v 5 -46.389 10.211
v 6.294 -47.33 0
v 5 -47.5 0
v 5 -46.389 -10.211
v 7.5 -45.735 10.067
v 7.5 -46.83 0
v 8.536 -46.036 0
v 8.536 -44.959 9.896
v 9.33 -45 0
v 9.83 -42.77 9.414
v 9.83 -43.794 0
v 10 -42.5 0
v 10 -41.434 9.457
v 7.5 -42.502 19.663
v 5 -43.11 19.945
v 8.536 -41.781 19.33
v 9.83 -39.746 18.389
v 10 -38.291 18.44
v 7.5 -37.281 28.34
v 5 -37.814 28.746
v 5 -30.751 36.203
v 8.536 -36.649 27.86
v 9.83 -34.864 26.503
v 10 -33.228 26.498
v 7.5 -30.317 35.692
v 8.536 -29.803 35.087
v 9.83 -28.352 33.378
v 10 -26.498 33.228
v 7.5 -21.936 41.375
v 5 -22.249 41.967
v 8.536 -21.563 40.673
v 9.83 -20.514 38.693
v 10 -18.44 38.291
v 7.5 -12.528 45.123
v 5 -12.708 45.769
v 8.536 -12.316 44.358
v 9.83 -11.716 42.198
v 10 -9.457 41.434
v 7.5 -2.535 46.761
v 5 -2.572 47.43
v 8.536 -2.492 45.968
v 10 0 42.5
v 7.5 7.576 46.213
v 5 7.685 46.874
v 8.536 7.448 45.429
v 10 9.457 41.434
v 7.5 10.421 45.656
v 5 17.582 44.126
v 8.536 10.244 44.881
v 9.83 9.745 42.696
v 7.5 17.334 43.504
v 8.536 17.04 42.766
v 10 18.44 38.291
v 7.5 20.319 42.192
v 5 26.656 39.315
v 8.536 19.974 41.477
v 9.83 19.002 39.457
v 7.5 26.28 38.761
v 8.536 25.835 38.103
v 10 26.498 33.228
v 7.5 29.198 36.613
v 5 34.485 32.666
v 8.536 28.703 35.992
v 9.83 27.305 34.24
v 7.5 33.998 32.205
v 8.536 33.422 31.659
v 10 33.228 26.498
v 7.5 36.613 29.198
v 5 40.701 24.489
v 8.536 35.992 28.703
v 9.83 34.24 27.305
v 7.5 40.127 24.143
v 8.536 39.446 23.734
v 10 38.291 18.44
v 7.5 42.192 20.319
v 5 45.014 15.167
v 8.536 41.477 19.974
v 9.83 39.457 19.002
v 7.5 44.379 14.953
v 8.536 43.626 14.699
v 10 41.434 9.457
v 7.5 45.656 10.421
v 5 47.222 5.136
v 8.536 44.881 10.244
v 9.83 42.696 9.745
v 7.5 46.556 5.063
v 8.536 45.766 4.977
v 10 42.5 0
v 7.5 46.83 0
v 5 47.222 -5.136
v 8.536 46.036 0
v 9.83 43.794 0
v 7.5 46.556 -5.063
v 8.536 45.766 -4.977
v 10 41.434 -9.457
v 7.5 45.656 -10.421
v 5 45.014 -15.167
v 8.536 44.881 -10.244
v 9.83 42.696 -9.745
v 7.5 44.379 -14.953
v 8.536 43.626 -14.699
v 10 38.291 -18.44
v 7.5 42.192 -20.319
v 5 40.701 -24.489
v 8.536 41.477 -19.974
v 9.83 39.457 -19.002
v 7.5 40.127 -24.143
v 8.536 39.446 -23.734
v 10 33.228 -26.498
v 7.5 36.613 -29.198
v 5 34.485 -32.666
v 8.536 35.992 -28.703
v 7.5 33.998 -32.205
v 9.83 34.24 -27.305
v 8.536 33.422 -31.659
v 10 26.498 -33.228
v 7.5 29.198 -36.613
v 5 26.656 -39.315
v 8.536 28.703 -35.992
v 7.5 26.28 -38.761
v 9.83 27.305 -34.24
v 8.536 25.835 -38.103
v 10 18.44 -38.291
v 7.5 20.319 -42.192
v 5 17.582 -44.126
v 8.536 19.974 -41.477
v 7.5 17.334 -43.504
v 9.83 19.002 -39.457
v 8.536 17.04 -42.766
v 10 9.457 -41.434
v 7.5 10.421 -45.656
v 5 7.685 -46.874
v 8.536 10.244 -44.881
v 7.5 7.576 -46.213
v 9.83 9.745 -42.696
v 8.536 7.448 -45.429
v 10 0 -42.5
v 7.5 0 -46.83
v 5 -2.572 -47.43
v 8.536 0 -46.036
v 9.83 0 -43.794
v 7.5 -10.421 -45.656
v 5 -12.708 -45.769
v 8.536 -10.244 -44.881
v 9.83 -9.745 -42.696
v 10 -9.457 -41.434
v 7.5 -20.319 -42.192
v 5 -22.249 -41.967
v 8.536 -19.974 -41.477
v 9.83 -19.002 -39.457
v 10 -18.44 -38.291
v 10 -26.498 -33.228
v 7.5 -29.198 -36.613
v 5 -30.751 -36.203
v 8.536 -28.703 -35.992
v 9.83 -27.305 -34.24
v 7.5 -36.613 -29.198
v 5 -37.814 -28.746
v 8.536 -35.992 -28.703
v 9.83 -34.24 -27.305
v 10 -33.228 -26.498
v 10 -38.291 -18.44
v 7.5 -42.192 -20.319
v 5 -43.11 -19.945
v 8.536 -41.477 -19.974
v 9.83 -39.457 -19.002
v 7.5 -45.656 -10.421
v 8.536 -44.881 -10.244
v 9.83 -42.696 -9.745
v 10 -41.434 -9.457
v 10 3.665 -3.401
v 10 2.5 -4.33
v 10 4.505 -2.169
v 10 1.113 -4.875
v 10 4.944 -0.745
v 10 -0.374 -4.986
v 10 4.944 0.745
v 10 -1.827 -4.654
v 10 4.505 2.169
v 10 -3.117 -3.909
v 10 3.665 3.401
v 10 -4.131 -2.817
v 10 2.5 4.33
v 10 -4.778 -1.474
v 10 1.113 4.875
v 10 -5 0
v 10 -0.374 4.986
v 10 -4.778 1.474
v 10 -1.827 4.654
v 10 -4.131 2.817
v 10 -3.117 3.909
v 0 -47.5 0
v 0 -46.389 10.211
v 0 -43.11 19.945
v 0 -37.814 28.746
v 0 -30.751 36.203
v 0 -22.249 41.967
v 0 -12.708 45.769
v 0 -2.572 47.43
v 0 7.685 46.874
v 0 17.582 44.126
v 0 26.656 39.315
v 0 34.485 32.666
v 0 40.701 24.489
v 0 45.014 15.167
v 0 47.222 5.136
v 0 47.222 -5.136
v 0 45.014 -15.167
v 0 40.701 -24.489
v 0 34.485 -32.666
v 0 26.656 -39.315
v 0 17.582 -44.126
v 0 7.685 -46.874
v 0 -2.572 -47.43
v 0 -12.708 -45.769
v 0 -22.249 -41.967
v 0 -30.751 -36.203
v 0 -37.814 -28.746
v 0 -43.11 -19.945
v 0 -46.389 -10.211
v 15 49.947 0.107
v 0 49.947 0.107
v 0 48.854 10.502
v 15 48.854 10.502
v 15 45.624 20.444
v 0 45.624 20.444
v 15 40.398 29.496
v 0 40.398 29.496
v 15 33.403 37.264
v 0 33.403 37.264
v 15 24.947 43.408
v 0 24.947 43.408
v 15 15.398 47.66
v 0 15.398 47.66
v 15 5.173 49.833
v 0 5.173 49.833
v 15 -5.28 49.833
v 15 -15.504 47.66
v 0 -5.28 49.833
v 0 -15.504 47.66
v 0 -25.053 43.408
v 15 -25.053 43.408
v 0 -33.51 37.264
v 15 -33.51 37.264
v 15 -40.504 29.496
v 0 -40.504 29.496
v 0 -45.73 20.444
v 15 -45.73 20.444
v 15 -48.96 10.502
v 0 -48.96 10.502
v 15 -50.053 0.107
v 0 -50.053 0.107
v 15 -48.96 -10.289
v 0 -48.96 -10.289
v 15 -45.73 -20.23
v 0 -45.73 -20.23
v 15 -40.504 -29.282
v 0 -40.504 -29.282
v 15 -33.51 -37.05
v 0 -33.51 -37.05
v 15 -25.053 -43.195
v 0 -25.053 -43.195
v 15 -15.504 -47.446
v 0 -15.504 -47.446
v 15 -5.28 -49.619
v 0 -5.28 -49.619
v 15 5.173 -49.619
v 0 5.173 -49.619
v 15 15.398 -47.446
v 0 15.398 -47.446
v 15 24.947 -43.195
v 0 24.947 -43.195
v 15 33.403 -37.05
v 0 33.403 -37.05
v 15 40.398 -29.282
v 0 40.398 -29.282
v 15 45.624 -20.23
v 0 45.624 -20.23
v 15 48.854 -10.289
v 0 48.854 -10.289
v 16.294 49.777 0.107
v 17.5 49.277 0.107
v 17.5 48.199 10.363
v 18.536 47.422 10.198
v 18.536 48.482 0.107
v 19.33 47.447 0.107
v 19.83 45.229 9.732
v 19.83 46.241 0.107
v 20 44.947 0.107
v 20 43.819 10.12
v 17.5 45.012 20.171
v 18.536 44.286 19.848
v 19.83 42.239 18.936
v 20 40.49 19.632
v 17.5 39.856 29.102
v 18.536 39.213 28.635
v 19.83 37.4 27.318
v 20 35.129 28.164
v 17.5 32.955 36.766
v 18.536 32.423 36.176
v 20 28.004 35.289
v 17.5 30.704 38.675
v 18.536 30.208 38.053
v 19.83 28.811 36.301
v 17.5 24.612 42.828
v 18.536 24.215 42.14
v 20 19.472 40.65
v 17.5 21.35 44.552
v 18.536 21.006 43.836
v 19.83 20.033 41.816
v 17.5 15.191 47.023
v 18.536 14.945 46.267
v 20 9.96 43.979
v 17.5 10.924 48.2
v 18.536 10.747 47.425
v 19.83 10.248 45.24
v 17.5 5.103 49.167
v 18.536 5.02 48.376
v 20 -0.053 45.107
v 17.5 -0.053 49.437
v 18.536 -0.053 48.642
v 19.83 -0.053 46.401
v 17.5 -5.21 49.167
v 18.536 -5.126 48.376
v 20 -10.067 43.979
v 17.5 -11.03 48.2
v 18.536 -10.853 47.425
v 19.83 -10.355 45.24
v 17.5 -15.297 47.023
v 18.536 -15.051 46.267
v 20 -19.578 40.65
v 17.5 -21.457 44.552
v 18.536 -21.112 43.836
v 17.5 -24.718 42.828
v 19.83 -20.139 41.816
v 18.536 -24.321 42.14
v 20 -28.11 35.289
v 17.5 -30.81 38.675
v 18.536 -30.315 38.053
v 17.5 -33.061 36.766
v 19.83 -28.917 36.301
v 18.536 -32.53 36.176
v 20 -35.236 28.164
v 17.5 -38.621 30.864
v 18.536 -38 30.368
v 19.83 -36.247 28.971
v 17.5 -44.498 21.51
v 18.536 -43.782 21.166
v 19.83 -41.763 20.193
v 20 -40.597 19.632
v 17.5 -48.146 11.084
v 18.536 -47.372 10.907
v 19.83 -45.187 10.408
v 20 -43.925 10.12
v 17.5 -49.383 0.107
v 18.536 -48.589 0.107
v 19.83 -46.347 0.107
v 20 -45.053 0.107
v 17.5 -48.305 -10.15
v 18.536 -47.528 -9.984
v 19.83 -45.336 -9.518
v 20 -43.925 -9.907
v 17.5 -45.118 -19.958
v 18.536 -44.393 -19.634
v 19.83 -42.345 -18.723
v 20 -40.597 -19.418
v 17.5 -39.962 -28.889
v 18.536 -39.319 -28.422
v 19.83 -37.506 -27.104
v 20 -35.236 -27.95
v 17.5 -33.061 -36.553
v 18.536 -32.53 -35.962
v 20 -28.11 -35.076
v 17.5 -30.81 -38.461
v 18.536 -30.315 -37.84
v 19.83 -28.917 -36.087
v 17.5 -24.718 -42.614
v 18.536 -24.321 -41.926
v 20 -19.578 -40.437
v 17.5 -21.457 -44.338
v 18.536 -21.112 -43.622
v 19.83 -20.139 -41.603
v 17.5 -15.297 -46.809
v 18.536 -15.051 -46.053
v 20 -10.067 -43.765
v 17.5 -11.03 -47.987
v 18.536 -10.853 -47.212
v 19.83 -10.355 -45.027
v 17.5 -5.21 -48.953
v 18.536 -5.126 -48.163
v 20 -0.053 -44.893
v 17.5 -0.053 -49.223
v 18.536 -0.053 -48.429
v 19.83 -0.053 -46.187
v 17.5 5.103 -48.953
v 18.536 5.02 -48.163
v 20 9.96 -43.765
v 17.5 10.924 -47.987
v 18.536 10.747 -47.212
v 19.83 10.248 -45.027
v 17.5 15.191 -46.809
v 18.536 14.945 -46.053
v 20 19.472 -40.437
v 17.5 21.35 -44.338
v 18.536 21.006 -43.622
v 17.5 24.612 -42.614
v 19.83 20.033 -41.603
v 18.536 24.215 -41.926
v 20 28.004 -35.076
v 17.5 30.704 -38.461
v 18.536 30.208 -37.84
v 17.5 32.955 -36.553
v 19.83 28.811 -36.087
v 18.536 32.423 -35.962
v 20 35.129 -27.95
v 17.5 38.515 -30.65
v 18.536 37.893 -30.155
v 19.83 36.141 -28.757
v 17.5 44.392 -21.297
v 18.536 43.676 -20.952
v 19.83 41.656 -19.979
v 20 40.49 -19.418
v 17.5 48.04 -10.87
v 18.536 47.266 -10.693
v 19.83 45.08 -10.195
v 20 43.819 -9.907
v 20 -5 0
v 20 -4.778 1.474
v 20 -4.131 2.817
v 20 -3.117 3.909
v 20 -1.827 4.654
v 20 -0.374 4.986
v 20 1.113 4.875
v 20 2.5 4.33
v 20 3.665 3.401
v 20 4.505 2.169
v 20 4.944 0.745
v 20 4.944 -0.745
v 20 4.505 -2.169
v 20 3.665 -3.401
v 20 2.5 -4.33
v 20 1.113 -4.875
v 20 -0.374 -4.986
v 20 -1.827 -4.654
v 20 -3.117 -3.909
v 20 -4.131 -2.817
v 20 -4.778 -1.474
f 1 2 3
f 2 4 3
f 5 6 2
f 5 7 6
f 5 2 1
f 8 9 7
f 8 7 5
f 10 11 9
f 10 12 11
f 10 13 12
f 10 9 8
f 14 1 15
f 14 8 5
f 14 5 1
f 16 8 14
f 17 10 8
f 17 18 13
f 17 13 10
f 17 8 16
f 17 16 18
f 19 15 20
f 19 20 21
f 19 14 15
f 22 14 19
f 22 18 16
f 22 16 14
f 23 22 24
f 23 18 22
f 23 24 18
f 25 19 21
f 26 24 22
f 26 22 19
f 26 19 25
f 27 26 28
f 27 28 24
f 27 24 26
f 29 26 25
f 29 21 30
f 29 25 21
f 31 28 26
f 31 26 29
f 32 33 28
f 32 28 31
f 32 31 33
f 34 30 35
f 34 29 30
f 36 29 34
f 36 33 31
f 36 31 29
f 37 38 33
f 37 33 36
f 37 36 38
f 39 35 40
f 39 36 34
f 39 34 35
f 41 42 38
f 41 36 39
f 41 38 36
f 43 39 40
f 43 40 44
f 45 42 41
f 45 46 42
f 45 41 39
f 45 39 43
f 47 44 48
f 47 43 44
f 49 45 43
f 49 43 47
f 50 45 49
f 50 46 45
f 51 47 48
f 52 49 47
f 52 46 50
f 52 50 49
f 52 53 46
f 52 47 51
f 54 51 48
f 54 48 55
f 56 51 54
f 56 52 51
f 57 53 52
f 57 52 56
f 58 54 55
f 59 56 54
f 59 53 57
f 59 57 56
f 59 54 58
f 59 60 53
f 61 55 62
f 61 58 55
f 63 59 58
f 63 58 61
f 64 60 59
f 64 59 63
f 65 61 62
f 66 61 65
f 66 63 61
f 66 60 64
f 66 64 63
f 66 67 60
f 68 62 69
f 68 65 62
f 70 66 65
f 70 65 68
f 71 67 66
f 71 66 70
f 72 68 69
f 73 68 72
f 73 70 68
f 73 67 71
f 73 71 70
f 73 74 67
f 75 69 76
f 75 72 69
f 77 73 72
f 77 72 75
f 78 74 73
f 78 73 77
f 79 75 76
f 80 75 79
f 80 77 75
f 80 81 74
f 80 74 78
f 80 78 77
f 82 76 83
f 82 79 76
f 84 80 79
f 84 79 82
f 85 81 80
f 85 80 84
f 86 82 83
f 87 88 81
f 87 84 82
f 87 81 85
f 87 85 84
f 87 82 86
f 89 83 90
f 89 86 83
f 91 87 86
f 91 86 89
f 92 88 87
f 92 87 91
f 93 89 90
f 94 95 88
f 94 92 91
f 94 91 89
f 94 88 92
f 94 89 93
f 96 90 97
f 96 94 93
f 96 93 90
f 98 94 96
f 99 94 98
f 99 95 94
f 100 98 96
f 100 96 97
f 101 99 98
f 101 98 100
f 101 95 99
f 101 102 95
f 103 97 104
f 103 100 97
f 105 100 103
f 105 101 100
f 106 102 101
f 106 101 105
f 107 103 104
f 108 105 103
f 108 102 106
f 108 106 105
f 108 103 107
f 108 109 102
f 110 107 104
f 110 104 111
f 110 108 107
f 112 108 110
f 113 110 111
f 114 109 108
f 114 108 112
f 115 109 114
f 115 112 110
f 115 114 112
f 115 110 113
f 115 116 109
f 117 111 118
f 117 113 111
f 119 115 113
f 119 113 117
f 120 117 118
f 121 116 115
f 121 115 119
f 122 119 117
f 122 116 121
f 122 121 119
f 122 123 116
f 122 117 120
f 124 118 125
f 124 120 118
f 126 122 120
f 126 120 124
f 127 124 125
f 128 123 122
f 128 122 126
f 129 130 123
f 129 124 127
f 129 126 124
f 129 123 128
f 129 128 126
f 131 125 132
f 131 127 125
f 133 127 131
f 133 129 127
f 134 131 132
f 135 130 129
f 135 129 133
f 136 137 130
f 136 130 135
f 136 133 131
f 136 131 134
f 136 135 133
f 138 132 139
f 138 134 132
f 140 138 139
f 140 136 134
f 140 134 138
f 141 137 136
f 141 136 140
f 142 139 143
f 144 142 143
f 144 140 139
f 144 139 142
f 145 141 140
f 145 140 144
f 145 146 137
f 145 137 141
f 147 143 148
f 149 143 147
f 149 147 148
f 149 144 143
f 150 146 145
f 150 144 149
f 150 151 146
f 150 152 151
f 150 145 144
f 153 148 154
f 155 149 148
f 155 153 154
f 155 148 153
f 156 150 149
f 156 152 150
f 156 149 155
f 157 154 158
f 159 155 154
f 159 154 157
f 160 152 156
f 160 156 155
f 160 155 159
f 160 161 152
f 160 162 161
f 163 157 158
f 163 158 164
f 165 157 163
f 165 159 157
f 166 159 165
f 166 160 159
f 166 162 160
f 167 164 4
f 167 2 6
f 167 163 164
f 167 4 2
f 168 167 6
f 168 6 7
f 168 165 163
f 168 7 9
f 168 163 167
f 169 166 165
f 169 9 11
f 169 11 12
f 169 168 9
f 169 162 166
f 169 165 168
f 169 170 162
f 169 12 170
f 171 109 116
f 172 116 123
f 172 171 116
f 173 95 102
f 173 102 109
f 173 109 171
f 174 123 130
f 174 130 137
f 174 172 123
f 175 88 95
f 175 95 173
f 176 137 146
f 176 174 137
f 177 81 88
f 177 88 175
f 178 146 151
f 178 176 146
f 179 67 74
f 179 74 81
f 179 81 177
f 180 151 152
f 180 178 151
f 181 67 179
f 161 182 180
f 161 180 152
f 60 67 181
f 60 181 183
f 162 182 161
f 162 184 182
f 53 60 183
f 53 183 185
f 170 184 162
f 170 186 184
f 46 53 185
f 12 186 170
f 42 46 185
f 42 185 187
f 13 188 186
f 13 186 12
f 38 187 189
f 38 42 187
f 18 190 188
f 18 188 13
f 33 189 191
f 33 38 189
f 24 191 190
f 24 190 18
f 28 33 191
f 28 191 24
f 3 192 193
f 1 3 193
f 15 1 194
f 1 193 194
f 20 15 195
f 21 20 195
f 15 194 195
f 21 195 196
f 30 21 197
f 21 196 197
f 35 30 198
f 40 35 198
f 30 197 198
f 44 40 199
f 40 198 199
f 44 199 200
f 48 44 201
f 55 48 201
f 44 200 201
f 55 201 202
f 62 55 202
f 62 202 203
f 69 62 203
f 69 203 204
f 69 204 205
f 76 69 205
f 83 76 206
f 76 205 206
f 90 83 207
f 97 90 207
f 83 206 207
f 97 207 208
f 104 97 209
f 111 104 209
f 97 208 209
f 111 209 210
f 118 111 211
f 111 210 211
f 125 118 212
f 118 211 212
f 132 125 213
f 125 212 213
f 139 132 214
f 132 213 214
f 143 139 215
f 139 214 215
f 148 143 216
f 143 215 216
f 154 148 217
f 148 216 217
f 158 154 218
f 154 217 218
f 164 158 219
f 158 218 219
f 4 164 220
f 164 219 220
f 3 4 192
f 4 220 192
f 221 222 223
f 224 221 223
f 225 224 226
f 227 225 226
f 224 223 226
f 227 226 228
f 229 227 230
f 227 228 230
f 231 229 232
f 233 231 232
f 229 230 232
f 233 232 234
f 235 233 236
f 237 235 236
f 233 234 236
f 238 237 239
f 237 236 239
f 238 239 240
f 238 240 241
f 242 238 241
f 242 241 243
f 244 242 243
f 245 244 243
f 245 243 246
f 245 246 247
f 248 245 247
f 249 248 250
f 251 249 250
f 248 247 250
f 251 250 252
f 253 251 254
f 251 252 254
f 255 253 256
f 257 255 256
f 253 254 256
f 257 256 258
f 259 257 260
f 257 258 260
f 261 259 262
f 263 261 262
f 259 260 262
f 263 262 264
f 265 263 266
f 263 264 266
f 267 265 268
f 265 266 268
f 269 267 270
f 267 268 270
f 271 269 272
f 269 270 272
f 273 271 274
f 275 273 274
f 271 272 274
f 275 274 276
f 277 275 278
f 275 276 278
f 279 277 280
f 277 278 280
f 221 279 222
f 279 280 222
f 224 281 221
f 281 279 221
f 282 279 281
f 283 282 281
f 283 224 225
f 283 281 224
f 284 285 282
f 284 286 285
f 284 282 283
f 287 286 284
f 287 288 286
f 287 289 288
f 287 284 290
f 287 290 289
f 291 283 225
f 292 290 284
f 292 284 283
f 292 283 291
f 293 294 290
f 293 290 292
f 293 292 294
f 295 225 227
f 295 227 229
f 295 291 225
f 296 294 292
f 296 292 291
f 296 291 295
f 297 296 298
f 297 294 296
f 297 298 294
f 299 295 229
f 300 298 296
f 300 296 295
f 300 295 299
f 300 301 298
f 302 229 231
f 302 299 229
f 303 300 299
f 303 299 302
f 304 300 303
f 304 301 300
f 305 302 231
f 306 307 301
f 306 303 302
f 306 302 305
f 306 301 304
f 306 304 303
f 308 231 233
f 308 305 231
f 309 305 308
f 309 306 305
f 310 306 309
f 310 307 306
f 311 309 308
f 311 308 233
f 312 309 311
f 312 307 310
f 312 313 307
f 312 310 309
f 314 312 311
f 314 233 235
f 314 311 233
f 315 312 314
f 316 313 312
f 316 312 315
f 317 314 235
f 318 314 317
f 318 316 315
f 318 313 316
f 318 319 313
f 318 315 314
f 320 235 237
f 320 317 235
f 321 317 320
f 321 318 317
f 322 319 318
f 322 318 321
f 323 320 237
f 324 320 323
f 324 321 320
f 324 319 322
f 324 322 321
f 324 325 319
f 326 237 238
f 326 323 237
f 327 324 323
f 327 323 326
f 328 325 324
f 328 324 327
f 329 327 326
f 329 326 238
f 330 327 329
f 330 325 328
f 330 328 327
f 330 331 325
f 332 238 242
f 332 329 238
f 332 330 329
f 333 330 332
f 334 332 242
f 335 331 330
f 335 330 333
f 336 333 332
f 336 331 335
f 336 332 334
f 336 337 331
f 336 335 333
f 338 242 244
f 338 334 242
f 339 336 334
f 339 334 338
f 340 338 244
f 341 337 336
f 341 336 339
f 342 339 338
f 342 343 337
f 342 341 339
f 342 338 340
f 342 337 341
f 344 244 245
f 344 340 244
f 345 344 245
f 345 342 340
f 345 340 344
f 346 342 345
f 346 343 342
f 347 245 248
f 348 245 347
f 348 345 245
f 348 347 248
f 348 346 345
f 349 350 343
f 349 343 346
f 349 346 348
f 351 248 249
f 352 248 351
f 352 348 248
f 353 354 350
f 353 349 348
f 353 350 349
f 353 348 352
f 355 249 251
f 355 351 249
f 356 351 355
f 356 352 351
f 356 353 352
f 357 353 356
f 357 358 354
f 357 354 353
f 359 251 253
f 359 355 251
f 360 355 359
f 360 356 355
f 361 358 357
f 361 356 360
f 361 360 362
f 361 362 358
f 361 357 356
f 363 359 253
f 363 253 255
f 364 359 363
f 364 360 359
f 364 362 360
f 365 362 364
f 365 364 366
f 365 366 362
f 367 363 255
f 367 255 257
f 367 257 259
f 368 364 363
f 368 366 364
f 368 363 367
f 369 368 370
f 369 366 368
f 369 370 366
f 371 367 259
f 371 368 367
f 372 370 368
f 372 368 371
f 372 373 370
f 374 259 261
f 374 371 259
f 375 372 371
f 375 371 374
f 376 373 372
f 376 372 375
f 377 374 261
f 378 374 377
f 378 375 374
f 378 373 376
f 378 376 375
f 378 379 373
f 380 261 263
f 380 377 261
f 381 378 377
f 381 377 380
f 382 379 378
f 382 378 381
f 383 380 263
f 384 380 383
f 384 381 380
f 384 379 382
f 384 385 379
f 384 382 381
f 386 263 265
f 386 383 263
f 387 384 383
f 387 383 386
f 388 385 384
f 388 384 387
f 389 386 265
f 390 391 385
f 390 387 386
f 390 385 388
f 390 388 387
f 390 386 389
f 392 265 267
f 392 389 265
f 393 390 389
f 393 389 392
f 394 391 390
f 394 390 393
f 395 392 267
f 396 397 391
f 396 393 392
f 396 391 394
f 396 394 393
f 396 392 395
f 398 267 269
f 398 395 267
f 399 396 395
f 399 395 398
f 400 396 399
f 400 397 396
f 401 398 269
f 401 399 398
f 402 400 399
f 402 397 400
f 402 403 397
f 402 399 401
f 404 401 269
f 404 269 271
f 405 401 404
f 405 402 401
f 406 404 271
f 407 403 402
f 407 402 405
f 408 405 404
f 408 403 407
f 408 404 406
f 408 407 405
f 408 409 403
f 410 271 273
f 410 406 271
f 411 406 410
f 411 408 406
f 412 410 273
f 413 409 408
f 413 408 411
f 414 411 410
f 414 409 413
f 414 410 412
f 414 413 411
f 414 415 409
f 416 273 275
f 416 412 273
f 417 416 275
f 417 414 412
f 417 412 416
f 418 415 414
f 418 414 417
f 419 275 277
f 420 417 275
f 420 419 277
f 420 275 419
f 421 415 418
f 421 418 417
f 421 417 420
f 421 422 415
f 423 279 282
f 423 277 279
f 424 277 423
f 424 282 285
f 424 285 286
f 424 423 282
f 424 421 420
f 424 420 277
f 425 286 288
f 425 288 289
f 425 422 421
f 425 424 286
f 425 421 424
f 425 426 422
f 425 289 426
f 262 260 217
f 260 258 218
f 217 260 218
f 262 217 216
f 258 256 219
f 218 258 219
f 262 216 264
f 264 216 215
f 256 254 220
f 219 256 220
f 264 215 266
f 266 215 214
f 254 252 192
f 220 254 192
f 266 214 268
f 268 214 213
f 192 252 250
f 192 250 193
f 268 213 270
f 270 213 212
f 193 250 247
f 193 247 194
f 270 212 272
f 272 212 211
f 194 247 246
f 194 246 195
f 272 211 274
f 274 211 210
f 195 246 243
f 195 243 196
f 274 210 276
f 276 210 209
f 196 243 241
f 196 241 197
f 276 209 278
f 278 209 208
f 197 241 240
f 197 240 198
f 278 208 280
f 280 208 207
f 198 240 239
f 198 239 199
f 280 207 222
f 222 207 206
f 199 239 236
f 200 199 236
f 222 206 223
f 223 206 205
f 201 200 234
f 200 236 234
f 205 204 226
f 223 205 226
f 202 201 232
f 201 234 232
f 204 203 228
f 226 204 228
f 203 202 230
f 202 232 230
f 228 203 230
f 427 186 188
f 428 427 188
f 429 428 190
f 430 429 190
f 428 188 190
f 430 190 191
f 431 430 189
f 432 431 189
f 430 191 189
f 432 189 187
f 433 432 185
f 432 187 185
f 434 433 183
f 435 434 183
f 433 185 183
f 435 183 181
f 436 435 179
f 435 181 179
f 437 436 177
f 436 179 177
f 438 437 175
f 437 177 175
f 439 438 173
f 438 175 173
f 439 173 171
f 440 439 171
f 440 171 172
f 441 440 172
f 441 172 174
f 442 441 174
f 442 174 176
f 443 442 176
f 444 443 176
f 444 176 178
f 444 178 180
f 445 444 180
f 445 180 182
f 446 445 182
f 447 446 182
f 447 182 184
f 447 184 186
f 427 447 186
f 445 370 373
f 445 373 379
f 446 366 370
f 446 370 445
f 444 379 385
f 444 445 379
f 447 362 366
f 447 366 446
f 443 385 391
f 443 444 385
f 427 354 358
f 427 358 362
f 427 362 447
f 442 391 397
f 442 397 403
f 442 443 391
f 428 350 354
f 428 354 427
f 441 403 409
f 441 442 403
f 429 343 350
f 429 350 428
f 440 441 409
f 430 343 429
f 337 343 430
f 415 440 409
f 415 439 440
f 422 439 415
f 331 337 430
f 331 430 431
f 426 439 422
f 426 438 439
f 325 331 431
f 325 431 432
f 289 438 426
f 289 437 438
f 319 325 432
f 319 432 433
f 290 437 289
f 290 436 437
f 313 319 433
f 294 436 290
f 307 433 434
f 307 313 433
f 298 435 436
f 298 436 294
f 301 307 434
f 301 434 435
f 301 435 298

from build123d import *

# Parameters (mm, degrees)
F0_R     = 50
F1_DEPTH = 20
F2_R     = 47.5
F3_DEPTH = 10
F4_R     = 5
F5_R     = 5
F6_R     = 5
F7_DEPTH = 25


with BuildPart() as f1:
    # F0 (on Right) → F1 (new body)
    with BuildSketch(Plane.YZ):
        with Locations((-0.053118, 0.106767)):
            Circle(F0_R)
    extrude(amount=F1_DEPTH)

    # F2 (on face) → F3 (cut)
    with BuildSketch(Plane(origin=(0, 0, 0), x_dir=(0, -1, 0), z_dir=(-1, 0, 0))):
        Circle(F2_R)
    extrude(amount=-F3_DEPTH, mode=Mode.SUBTRACT)

    # F4
    f4_edges = [f1.edges().sort_by_distance(p)[0] for p in [
        (10, 47.5, 0),
    ]]
    fillet(f4_edges, radius=F4_R)

    # F5
    f5_edges = [f1.edges().sort_by_distance(p)[0] for p in [
        (10, 42.5, 0),
        (20, -50.053118, 0.106767),
    ]]
    fillet(f5_edges, radius=F5_R)

    # F6 (on face) → F7 (cut)
    with BuildSketch(Plane(origin=(10, 0, 0), x_dir=(0, -1, 0), z_dir=(-1, 0, 0))):
        Circle(F6_R)
    extrude(amount=-F7_DEPTH, mode=Mode.SUBTRACT)


solid = f1.part
